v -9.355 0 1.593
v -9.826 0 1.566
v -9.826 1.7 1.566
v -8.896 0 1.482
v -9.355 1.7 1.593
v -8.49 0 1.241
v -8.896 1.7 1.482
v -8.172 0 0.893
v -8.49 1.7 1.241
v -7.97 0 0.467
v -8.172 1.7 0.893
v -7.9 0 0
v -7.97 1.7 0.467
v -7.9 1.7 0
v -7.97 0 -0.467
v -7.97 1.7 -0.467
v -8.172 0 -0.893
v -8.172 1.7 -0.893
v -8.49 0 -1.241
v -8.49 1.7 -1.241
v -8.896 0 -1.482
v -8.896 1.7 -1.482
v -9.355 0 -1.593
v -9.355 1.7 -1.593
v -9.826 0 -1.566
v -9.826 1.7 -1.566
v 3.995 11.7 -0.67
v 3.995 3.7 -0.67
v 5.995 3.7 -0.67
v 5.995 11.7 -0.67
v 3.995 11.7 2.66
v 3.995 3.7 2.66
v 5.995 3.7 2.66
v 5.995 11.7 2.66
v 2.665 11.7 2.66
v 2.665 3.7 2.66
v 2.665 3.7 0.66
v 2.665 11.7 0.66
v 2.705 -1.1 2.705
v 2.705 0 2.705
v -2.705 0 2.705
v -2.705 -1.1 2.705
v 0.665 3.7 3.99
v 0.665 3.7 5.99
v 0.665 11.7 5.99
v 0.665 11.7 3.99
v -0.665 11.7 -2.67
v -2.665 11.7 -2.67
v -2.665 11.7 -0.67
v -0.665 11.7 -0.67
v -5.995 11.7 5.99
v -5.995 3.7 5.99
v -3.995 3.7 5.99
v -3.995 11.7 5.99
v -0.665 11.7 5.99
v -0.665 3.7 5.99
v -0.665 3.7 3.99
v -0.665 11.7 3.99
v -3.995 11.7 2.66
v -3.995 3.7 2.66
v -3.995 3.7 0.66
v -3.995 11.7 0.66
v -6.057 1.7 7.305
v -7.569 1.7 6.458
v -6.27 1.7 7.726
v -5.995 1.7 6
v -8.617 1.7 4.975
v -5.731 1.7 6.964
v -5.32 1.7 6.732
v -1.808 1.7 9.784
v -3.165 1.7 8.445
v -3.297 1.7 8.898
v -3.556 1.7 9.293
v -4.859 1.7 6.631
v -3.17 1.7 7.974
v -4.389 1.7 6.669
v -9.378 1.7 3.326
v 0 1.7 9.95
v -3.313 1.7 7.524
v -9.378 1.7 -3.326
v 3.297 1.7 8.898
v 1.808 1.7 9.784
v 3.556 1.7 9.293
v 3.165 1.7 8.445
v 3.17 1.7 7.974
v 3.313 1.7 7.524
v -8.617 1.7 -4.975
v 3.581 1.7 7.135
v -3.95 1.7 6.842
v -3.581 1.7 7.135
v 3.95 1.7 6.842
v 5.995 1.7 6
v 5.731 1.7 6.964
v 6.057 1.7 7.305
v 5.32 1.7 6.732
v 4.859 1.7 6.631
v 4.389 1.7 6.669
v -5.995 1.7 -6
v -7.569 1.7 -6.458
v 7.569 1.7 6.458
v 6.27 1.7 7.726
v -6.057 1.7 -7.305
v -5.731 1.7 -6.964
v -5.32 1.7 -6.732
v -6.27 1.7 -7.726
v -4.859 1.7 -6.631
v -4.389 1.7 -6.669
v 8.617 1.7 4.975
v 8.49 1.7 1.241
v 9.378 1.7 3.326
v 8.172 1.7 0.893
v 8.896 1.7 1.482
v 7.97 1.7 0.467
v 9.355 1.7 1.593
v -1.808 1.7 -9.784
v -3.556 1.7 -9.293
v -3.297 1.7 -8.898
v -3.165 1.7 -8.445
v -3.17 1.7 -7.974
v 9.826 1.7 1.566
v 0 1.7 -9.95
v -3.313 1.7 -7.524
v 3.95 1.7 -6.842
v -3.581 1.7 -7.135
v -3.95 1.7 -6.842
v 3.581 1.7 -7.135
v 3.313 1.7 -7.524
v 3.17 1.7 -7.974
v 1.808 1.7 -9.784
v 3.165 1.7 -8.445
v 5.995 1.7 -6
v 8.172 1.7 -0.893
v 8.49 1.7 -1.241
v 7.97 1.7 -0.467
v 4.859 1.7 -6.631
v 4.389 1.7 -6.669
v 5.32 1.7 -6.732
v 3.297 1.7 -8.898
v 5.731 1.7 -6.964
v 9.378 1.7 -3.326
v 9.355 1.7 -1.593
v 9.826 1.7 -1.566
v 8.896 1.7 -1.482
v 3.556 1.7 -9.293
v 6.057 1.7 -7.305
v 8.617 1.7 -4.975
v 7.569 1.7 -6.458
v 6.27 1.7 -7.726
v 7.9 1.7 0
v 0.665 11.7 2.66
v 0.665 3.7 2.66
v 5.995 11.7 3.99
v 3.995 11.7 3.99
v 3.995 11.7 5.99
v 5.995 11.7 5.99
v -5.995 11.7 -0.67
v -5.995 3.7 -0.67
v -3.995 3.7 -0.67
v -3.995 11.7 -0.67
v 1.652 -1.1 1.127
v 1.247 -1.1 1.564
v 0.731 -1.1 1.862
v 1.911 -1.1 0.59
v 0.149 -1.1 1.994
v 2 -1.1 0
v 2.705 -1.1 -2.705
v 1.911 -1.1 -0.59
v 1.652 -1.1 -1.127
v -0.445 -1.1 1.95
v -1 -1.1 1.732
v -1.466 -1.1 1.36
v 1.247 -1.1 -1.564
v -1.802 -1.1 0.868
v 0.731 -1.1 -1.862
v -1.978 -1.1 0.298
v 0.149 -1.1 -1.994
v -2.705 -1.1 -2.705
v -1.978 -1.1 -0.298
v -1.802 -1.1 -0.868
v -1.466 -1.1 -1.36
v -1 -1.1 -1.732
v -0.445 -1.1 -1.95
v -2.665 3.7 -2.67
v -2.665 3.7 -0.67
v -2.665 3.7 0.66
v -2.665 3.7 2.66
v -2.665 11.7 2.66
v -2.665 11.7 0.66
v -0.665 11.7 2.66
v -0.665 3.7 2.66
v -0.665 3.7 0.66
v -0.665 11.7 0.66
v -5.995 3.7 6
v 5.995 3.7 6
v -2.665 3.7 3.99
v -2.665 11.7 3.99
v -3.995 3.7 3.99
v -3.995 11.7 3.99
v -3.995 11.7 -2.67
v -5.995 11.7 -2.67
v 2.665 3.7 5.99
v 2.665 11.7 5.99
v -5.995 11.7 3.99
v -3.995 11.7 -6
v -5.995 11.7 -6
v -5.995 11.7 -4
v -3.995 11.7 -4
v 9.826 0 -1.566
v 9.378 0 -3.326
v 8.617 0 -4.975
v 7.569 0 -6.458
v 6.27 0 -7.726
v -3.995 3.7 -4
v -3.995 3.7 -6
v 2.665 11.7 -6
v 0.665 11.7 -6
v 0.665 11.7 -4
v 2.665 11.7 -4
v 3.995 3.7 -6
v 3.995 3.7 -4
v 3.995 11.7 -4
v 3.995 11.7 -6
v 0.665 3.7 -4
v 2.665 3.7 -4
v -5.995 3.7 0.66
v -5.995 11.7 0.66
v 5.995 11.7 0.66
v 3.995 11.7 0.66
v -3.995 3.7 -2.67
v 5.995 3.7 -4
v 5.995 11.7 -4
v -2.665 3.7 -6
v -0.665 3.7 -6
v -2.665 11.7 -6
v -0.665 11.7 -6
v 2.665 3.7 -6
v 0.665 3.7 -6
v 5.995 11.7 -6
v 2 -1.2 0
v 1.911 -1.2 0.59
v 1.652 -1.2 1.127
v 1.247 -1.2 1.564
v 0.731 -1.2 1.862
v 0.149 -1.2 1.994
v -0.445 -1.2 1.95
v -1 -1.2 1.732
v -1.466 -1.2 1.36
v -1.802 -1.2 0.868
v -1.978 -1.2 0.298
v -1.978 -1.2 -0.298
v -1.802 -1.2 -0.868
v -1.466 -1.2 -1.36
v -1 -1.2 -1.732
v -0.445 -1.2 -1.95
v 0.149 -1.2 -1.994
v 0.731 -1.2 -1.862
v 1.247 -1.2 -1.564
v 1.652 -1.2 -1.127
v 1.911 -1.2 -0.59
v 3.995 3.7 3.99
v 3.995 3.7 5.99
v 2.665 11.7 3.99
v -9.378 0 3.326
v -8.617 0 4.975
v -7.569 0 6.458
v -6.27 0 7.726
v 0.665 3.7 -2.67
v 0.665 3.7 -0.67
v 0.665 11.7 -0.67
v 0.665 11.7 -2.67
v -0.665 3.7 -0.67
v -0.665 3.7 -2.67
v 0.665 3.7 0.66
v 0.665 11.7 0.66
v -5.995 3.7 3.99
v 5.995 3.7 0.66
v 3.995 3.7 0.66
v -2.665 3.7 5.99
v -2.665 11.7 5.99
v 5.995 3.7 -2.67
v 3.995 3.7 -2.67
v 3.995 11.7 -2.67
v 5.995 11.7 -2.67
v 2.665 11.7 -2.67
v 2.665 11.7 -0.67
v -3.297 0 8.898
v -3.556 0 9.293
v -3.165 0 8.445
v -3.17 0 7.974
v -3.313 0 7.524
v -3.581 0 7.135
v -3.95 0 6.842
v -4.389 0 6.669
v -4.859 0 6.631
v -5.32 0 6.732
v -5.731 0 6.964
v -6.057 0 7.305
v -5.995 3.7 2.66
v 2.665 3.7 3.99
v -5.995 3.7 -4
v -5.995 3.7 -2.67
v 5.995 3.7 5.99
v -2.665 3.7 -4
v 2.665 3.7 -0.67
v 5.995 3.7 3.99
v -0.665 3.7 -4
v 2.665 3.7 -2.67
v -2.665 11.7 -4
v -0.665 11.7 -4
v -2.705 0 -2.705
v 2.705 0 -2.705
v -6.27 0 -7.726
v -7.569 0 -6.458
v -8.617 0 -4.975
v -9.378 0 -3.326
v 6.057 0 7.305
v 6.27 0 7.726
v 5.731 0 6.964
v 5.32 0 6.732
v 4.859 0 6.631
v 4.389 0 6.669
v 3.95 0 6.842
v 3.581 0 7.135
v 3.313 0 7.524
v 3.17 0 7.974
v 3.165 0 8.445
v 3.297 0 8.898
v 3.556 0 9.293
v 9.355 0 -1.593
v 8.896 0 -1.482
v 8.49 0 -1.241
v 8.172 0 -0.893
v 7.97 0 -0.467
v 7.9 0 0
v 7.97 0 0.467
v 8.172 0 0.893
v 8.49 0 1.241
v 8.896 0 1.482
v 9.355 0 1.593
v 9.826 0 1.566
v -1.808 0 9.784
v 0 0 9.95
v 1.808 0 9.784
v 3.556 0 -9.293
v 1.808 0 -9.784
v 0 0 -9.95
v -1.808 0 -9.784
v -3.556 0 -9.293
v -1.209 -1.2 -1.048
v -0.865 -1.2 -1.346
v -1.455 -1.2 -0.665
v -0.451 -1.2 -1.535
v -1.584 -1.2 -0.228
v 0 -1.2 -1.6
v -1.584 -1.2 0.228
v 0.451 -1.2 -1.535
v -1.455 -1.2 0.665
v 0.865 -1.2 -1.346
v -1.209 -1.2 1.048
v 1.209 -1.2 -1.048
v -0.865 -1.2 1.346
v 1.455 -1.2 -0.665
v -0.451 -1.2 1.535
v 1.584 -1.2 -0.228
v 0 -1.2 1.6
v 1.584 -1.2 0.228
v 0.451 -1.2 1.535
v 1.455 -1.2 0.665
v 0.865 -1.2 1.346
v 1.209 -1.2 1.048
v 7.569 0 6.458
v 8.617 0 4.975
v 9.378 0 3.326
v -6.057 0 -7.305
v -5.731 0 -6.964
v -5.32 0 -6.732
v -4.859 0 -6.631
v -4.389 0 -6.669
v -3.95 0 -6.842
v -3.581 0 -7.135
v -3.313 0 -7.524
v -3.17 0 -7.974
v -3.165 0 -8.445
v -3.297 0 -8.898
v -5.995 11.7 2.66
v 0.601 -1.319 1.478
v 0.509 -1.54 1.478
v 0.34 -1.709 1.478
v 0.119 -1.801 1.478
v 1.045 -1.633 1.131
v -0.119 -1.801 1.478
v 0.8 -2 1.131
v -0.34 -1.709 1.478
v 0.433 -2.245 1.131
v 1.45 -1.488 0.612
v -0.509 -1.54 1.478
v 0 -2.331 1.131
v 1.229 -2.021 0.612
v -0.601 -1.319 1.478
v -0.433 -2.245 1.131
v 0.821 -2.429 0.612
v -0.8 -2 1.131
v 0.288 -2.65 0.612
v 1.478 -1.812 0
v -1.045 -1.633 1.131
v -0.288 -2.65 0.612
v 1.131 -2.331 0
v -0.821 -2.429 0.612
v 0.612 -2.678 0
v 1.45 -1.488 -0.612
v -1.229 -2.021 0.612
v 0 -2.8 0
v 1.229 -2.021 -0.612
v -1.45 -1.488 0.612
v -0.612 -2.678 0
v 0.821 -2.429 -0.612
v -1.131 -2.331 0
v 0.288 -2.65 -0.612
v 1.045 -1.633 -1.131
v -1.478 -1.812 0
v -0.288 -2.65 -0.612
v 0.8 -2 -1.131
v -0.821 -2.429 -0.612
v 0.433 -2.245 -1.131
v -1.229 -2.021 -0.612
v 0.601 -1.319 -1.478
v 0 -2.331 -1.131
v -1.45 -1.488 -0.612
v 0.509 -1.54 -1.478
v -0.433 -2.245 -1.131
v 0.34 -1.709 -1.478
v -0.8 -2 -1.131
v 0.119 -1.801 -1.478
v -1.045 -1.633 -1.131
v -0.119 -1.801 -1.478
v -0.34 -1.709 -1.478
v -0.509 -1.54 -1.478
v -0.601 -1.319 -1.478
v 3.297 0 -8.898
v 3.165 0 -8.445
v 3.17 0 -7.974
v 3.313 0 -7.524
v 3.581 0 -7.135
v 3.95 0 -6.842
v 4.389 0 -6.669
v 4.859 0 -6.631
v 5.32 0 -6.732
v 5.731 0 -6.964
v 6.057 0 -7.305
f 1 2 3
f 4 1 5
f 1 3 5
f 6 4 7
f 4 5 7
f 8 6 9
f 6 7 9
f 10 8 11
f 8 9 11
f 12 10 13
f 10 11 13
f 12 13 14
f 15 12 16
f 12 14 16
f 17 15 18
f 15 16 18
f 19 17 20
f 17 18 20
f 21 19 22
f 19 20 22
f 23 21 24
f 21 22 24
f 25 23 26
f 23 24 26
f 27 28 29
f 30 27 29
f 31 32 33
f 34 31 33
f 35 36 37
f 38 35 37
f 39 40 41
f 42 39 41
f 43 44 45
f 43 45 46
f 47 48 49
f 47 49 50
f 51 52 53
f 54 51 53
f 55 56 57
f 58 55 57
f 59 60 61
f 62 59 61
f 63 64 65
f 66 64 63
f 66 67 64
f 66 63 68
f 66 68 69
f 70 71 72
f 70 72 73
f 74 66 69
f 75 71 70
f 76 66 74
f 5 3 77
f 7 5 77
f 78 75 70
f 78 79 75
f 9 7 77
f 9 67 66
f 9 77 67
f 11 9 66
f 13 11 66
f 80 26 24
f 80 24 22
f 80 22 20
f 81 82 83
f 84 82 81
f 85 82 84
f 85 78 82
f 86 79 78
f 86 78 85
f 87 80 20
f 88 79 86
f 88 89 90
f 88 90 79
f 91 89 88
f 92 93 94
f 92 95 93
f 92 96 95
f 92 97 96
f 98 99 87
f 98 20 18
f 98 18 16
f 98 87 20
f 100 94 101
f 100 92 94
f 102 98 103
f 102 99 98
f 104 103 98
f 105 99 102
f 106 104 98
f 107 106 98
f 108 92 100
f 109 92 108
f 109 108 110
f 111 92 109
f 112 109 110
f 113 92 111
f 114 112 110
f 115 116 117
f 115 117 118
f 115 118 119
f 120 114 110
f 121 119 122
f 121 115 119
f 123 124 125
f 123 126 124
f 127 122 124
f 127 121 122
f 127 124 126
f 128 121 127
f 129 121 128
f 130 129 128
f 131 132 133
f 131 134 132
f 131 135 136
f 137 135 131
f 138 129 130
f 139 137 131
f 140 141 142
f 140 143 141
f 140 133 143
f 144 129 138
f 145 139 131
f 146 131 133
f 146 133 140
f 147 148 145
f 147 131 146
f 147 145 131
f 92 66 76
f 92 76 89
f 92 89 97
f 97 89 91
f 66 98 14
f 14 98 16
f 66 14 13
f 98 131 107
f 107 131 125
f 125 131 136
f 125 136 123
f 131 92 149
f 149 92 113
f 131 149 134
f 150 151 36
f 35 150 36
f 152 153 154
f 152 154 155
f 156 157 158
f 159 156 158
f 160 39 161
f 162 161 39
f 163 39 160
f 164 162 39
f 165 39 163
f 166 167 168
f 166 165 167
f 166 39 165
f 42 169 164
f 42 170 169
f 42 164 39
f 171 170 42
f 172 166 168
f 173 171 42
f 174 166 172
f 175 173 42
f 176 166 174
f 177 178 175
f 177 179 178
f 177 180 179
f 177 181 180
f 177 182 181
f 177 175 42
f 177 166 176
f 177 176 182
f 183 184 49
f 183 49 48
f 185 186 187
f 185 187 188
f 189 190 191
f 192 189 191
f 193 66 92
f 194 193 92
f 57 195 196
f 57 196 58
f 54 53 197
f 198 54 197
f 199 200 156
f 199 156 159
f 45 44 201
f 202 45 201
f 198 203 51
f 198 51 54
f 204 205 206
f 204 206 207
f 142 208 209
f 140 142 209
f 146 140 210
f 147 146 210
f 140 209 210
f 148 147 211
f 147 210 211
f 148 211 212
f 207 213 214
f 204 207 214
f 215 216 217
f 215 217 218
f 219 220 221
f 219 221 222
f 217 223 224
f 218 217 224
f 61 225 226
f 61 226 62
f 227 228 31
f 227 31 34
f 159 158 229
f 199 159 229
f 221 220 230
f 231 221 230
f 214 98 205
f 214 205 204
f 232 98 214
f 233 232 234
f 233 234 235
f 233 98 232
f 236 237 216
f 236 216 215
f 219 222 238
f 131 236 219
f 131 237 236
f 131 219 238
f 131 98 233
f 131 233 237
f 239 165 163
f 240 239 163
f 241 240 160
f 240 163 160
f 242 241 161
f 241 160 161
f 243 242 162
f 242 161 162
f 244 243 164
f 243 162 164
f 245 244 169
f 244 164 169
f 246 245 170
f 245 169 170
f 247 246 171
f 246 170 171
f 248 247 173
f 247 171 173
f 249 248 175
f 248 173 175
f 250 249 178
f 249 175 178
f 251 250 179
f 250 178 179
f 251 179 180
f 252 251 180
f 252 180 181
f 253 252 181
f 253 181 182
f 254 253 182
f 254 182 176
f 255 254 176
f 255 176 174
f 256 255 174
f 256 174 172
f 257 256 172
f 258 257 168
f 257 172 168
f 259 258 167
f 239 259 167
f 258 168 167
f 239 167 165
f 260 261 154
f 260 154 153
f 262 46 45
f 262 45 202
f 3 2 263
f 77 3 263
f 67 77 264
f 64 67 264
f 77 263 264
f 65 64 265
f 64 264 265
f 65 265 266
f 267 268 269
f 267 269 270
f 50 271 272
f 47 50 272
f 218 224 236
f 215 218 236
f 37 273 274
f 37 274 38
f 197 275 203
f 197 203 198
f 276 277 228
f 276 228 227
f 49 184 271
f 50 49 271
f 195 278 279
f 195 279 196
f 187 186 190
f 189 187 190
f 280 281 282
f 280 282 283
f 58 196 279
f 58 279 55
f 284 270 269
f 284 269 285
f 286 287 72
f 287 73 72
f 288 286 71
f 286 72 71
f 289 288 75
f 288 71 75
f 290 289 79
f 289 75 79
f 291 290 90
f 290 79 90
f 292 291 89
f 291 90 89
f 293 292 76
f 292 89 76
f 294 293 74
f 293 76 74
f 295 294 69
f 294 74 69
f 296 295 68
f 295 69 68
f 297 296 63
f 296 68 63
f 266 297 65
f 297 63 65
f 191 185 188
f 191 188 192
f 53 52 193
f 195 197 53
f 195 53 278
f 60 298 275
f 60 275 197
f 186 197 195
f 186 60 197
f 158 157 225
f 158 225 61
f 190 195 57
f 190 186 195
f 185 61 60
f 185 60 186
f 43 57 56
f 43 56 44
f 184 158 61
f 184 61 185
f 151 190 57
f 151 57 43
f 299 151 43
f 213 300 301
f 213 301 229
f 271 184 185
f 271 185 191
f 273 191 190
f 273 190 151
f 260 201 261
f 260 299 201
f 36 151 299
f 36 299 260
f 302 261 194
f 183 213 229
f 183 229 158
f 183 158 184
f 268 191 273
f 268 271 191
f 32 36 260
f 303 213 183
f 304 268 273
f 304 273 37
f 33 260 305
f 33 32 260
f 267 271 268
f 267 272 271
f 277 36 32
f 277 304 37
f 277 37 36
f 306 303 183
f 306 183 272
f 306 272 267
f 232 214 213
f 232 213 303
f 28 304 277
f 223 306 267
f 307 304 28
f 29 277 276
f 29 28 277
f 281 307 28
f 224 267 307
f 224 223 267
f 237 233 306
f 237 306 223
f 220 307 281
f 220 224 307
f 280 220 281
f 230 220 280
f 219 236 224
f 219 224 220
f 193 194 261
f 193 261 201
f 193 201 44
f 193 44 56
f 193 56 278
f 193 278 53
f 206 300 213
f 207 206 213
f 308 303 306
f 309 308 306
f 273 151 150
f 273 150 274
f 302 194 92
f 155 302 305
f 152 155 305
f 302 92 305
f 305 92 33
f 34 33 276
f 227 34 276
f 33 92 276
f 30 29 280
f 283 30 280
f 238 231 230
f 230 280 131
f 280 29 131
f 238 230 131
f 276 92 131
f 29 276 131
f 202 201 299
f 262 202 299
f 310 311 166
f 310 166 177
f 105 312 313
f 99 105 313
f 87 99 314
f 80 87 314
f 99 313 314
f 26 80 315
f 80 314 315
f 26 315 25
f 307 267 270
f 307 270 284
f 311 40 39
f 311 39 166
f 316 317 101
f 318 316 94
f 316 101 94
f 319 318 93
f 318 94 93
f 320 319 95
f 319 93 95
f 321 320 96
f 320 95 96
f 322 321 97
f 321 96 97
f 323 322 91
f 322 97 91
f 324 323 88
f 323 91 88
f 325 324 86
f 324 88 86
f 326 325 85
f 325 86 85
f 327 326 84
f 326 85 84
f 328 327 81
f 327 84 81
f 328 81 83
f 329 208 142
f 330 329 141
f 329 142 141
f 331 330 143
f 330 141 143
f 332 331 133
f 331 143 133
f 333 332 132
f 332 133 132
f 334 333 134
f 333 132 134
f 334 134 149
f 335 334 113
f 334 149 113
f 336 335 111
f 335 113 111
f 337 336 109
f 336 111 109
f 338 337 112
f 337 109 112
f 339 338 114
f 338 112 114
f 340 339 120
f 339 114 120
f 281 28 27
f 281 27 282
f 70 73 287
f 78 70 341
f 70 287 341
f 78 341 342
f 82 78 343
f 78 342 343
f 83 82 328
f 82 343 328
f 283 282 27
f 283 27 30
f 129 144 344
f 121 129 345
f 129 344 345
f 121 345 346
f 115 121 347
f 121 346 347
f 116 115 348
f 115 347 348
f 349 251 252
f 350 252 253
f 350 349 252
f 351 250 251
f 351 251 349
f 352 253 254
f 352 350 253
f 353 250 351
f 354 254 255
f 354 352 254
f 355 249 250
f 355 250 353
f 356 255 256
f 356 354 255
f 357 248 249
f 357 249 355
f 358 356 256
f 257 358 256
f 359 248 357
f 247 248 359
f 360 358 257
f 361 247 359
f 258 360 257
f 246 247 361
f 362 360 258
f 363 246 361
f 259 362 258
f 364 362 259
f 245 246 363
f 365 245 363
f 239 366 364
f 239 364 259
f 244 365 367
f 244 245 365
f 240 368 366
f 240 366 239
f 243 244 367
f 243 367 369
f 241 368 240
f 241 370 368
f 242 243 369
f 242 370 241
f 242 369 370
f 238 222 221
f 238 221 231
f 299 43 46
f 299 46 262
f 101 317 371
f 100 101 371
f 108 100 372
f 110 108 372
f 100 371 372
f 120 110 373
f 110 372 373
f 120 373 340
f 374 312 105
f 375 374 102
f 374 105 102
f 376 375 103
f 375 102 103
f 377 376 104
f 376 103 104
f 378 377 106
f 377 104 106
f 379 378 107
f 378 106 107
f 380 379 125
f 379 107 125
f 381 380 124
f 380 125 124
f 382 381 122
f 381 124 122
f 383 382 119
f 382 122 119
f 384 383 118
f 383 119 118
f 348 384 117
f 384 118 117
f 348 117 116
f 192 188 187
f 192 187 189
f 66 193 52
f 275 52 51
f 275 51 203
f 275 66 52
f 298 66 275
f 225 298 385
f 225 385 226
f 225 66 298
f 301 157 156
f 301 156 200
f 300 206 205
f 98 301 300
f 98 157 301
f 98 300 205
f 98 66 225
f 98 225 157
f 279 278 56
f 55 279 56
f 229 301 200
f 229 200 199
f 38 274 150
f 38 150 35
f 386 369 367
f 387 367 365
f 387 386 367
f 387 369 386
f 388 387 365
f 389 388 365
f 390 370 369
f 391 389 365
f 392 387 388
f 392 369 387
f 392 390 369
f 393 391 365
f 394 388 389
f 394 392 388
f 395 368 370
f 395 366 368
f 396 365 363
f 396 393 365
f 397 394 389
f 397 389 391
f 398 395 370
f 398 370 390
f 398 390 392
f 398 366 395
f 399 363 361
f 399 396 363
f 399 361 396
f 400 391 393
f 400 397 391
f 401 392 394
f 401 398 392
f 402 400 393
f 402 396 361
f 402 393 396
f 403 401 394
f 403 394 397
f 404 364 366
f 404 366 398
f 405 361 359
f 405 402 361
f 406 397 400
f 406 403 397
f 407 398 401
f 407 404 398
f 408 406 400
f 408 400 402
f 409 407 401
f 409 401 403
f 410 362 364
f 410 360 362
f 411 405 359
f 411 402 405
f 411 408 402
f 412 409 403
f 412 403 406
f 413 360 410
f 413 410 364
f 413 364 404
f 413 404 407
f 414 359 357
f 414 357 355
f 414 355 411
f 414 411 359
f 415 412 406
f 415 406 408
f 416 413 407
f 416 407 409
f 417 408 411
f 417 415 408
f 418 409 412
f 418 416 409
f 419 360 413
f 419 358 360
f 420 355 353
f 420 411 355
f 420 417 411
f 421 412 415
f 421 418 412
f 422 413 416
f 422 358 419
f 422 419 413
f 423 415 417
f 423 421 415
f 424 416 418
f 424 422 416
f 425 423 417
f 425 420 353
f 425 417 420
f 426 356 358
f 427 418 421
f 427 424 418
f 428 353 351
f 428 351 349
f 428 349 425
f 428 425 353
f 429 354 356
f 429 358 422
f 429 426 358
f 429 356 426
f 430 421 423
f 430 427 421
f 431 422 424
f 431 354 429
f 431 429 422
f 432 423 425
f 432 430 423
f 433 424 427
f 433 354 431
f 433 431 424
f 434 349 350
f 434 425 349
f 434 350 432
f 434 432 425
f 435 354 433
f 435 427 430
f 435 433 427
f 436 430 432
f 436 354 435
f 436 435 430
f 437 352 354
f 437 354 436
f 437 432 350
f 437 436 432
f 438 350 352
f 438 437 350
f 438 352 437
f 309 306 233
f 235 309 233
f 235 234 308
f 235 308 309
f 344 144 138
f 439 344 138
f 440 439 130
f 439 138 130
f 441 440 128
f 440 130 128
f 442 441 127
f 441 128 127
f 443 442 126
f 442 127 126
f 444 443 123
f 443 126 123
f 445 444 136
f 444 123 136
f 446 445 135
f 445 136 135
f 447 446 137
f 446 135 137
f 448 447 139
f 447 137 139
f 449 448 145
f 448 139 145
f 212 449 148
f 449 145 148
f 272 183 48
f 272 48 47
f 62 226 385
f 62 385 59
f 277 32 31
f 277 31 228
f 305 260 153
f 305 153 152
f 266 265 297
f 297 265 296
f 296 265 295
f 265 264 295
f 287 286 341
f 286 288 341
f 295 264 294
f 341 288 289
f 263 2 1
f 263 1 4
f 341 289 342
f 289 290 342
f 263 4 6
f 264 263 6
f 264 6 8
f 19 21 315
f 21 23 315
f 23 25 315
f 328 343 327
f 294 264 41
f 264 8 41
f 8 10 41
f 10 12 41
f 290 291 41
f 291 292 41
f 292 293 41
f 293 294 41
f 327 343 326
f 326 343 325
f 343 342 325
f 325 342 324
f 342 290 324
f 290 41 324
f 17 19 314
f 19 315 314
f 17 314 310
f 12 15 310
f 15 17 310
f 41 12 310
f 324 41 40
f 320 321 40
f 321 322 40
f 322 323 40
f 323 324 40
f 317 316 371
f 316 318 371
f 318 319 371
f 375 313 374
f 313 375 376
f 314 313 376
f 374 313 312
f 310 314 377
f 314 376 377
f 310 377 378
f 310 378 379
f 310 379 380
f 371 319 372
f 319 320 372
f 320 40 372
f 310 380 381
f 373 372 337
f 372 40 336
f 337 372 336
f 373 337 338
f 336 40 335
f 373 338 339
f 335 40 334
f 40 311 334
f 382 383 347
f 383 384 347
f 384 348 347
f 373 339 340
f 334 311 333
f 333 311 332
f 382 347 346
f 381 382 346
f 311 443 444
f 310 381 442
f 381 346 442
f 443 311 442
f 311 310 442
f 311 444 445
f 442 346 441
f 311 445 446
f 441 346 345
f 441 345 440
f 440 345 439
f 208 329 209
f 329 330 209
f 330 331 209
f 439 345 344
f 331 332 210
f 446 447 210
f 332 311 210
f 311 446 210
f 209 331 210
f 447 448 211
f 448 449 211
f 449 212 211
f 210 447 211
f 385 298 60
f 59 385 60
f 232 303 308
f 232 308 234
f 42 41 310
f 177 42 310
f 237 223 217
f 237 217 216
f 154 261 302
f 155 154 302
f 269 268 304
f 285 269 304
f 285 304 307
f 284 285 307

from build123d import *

# Parameters (mm, degrees)
SKETCH1_R           = 9.95
BOSS_EXTRUDE1_DEPTH = 1.7
SKETCH2_R           = 1.6
CUT_EXTRUDE1_DEPTH  = 2.7
SKETCH3_W           = 11.99
SKETCH3_H           = 12
BOSS_EXTRUDE2_DEPTH = 2
SKETCH4_W           = 2
SKETCH4_H           = 2
BOSS_EXTRUDE4_DEPTH = 8
SKETCH5_W           = 5.41
SKETCH5_H           = 5.41
BOSS_EXTRUDE5_DEPTH = 1.1
SKETCH6_R           = 2
BOSS_EXTRUDE6_DEPTH = 0.1
REVOLVE1_ANGLE      = 180


with BuildPart() as part:
    # Sketch1 → Boss-Extrude1 (new body)
    with BuildSketch(Plane(origin=(0, 0, 0), x_dir=(1, 0, 0), z_dir=(0, 1, 0))):
        Circle(SKETCH1_R)
    extrude(amount=BOSS_EXTRUDE1_DEPTH)

    # Sketch2 → Cut-Extrude1 (cut, through all)
    with BuildSketch(Plane(origin=(0, 1.7, 0), x_dir=(1, 0, 0), z_dir=(0, 1, 0))):
        with Locations((9.5, 0)):
            Circle(SKETCH2_R)
        with Locations((4.75, -8.227241336)):
            Circle(SKETCH2_R)
        with Locations((-4.75, -8.227241336)):
            Circle(SKETCH2_R)
        with Locations((-9.5, 0)):
            Circle(SKETCH2_R)
        with Locations((-4.75, 8.227241336)):
            Circle(SKETCH2_R)
        with Locations((4.75, 8.227241336)):
            Circle(SKETCH2_R)
    extrude(amount=-CUT_EXTRUDE1_DEPTH, mode=Mode.SUBTRACT)

    # Sketch3 → Boss-Extrude2 (add)
    with BuildSketch(Plane(origin=(0, 1.7, 0), x_dir=(1, 0, 0), z_dir=(0, 1, 0))):
        Rectangle(SKETCH3_W, SKETCH3_H)
    extrude(amount=BOSS_EXTRUDE2_DEPTH)

    # Sketch4 → Boss-Extrude4 (add)
    with BuildSketch(Plane(origin=(0, 3.7, 0), x_dir=(1, 0, 0), z_dir=(0, 1, 0))):
        with Locations((4.995, 5)):
            Rectangle(SKETCH4_W, SKETCH4_H)
        with Locations((1.665, 5)):
            Rectangle(SKETCH4_W, SKETCH4_H)
        with Locations((-1.665, 5)):
            Rectangle(SKETCH4_W, SKETCH4_H)
        with Locations((-4.995, 5)):
            Rectangle(SKETCH4_W, SKETCH4_H)
        with Locations((1.665, 1.67)):
            Rectangle(SKETCH4_W, SKETCH4_H)
        with Locations((-1.665, 1.67)):
            Rectangle(SKETCH4_W, SKETCH4_H)
        with Locations((-4.995, 1.67)):
            Rectangle(SKETCH4_W, SKETCH4_H)
        with Locations((1.665, -1.66)):
            Rectangle(SKETCH4_W, SKETCH4_H)
        with Locations((-1.665, -1.66)):
            Rectangle(SKETCH4_W, SKETCH4_H)
        with Locations((-4.995, -1.66)):
            Rectangle(SKETCH4_W, SKETCH4_H)
        with Locations((1.665, -4.99)):
            Rectangle(SKETCH4_W, SKETCH4_H)
        with Locations((-1.665, -4.99)):
            Rectangle(SKETCH4_W, SKETCH4_H)
        with Locations((-4.995, -4.99)):
            Rectangle(SKETCH4_W, SKETCH4_H)
        with Locations((4.995, 1.67)):
            Rectangle(SKETCH4_W, SKETCH4_H)
        with Locations((4.995, -1.66)):
            Rectangle(SKETCH4_W, SKETCH4_H)
        with Locations((4.995, -4.99)):
            Rectangle(SKETCH4_W, SKETCH4_H)
    extrude(amount=BOSS_EXTRUDE4_DEPTH)

    # Sketch5 → Boss-Extrude5 (add)
    with BuildSketch(Plane(origin=(0, 0, 0), x_dir=(-1, 0, 0), z_dir=(0, -1, 0))):
        Rectangle(SKETCH5_W, SKETCH5_H)
    extrude(amount=BOSS_EXTRUDE5_DEPTH)

    # Sketch6 → Boss-Extrude6 (add)
    with BuildSketch(Plane.XZ.offset(1.1)):
        Circle(SKETCH6_R)
    extrude(amount=BOSS_EXTRUDE6_DEPTH)

    # Sketch7 → Revolve1 (revolve)
    with BuildSketch(Plane(origin=(0, -1.2, 0), x_dir=(-1, 0, 0), z_dir=(0, -1, 0))):
        with BuildLine():
            Line((0, 1.6), (0, -1.6))
            ThreePointArc((0, -1.6), (-1.6, 0), (0, 1.6))
        make_face()
    revolve(axis=Axis((0, -1.2, -1.6), (0, 0, -1)), revolution_arc=REVOLVE1_ANGLE)


solid = part.part
